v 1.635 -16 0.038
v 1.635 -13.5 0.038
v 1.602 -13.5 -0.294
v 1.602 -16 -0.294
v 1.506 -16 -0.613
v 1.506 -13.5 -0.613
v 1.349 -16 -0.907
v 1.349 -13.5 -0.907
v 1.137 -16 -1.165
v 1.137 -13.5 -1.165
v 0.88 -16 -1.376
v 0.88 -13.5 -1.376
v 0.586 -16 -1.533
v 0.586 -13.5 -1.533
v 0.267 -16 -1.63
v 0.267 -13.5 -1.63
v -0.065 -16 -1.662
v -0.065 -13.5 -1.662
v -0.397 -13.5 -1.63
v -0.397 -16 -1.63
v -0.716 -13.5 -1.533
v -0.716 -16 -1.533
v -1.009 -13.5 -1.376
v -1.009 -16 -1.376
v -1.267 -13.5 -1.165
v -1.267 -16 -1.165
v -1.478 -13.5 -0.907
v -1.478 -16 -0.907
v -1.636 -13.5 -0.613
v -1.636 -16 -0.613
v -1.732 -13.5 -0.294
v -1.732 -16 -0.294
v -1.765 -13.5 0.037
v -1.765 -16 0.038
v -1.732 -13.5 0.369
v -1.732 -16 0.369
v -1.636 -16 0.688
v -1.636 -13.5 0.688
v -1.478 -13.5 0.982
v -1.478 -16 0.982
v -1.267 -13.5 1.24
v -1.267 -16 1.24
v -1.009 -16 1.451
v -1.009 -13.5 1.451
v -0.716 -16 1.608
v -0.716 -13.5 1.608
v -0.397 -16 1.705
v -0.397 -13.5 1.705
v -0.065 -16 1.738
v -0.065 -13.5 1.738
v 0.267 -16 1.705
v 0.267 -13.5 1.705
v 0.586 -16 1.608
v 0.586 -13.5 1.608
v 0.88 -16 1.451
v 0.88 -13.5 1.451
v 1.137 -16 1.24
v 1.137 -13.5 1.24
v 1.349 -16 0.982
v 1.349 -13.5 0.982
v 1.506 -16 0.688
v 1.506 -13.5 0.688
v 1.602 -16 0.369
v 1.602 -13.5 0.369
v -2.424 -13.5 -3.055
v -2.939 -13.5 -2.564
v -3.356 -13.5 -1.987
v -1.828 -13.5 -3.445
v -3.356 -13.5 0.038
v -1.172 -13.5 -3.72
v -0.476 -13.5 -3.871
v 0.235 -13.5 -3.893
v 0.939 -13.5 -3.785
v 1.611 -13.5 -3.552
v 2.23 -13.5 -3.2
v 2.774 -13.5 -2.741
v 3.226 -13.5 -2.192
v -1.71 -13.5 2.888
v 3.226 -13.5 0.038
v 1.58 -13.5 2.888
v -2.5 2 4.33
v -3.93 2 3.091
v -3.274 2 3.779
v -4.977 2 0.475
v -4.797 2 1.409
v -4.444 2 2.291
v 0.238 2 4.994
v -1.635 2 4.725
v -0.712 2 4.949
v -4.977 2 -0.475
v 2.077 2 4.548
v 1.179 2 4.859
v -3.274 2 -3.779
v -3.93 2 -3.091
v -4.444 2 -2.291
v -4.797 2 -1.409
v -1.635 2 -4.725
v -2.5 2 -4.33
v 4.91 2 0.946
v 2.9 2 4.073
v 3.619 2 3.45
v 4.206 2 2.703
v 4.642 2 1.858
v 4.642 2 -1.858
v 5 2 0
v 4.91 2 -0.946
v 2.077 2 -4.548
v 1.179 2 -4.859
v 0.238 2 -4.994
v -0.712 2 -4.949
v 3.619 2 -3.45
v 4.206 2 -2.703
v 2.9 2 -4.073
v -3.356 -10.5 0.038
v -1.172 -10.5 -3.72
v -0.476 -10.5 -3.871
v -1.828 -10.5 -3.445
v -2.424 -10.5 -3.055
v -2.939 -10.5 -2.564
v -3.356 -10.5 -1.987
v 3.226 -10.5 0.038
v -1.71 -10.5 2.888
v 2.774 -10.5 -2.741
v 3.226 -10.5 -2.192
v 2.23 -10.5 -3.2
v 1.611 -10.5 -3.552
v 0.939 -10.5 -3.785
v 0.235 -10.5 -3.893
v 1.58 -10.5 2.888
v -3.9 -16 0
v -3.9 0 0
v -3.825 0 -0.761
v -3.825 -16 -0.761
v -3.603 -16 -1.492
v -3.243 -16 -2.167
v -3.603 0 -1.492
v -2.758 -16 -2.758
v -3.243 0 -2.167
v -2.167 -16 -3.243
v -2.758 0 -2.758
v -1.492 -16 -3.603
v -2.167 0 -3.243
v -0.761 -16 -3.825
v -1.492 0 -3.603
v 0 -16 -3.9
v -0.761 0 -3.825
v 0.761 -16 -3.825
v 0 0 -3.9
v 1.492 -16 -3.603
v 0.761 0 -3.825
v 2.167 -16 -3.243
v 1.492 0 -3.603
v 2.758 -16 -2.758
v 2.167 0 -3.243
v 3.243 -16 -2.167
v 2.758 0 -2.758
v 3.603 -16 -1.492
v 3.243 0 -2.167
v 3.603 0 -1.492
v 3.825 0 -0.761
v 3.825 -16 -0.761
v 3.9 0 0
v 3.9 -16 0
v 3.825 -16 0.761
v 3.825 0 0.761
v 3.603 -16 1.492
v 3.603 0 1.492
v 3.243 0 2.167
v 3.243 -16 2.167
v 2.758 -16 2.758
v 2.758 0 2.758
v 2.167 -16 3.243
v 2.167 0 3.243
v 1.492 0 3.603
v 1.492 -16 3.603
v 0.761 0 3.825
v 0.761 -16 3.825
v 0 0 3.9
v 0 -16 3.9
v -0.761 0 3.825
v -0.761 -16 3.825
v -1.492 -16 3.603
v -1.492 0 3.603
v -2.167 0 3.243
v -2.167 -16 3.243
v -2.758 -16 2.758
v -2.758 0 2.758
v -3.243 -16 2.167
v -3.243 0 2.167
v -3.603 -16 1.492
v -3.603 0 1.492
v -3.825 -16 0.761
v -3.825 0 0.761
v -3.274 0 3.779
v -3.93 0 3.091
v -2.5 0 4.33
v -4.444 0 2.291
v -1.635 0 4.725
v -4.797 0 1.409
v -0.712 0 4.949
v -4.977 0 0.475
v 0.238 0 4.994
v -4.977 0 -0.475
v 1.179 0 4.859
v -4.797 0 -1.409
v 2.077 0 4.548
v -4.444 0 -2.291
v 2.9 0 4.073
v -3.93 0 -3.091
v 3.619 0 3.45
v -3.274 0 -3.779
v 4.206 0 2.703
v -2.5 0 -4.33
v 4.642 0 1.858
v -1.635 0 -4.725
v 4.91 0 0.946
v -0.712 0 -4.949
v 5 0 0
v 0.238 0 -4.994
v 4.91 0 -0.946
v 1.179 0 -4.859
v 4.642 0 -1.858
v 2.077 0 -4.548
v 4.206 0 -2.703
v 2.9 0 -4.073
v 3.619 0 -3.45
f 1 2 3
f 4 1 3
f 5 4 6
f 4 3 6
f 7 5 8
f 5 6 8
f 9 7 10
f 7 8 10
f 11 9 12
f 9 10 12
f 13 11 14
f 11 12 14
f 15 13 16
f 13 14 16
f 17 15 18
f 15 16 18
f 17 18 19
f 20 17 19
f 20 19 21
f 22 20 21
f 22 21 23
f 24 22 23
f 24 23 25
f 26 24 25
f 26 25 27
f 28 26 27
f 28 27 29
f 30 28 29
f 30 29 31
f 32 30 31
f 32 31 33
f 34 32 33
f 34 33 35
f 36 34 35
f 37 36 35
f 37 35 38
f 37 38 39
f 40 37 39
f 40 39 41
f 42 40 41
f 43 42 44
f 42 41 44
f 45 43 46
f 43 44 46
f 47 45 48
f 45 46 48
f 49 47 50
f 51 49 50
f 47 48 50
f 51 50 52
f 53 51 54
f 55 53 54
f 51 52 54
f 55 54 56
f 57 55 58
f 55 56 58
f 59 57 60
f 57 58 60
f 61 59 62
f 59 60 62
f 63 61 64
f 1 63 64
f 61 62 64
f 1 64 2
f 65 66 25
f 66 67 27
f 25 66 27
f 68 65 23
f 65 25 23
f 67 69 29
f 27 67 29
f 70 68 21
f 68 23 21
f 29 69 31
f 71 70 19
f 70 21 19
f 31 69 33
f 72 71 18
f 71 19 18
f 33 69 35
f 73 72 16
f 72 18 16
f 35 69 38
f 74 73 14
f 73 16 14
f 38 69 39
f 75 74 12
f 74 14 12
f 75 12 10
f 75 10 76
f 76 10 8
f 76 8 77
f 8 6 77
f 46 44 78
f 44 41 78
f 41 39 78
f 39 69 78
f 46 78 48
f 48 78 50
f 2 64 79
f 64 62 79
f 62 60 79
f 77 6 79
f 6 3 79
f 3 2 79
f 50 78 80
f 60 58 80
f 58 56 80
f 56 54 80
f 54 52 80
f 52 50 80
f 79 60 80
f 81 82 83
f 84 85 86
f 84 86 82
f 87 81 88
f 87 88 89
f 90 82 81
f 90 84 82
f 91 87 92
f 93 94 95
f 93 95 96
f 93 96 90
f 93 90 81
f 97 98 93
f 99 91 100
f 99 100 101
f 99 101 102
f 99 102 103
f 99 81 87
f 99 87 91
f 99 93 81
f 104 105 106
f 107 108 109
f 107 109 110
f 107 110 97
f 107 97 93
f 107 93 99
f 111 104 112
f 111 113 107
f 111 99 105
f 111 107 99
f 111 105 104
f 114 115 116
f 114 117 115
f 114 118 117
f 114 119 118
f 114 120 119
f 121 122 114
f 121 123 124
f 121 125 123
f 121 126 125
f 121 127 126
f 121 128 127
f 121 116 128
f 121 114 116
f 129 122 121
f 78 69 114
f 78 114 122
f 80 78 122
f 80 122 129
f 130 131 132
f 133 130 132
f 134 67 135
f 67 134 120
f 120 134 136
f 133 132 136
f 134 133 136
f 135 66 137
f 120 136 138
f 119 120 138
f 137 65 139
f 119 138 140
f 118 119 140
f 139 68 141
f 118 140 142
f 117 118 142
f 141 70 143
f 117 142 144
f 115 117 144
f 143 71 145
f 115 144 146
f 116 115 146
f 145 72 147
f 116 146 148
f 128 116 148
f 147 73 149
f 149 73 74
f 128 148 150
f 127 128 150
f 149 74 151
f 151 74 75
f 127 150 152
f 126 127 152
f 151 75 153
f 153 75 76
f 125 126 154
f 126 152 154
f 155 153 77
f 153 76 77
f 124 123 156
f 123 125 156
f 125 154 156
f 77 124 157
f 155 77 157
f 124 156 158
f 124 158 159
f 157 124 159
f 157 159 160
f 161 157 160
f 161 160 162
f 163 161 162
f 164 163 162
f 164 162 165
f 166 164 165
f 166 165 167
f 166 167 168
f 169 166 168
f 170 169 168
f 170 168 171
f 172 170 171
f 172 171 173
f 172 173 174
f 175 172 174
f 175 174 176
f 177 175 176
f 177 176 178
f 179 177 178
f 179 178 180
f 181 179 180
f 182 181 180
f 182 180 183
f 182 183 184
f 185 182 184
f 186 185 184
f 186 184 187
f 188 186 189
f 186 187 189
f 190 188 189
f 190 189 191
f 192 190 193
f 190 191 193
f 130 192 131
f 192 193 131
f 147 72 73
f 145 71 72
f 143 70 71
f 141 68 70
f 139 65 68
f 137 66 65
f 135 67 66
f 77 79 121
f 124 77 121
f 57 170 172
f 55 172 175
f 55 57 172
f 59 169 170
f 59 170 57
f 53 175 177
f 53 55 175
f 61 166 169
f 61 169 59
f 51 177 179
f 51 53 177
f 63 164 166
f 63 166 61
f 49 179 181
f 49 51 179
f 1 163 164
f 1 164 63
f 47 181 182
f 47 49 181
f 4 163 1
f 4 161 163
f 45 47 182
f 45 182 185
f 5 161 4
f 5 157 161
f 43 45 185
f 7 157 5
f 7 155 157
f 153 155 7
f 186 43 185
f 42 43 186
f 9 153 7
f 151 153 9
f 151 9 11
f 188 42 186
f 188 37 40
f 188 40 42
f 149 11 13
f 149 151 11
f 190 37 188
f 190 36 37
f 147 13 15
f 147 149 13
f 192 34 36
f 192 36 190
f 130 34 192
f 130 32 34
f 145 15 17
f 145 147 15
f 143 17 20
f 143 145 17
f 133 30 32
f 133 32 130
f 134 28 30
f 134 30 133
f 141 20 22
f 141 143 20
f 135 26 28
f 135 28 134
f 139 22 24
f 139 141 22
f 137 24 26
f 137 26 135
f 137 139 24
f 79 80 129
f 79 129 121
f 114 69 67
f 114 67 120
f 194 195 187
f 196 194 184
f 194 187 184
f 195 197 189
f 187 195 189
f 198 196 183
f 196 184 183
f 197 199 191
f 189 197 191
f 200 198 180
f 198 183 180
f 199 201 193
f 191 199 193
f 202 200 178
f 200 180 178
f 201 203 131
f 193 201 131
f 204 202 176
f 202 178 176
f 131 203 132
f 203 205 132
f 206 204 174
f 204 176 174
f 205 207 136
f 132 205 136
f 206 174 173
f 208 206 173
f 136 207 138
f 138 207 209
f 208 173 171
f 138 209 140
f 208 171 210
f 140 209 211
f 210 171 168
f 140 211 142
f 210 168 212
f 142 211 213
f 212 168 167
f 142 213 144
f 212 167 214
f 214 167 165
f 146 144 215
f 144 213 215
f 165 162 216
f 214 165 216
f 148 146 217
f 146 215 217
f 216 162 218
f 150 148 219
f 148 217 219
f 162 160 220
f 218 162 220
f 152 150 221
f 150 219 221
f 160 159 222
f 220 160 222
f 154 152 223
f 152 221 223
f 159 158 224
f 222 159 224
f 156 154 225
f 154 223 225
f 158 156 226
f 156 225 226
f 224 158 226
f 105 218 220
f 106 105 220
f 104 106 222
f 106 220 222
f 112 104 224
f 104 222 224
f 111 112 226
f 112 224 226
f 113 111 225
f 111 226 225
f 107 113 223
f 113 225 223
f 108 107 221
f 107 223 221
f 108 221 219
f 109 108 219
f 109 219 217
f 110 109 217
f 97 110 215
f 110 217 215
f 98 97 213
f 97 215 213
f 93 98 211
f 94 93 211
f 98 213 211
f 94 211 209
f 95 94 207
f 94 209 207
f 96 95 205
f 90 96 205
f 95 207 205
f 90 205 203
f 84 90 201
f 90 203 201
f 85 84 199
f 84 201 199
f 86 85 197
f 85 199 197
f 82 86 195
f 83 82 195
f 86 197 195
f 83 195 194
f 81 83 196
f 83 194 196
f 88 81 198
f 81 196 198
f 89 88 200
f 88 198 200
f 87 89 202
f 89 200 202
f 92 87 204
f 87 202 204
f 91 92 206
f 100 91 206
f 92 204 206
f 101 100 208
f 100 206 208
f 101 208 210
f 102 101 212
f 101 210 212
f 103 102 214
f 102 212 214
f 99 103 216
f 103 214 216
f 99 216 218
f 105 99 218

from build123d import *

# Parameters (mm, degrees)
SKETCH1_R               = 5
BOSS_EXTRUDE1_DEPTH     = 2
SKETCH4_R               = 3.9
BOSS_EXTRUDE2_DEPTH     = 16
CUT_EXTRUDE4_DEPTH      = 3
SKETCH3_5_R             = 1.7
CUT_EXTRUDE5_DEPTH      = 3
CUT_EXTRUDE5_DEPTH_BACK = 3.5
SKETCH5_W               = 6.581793069
SKETCH5_H               = 3
CUT_EXTRUDE6_DEPTH      = 6.0375


with BuildPart() as part:
    # Sketch1 → Boss-Extrude1 (new body)
    with BuildSketch(Plane(origin=(0, 0, 0), x_dir=(1, 0, 0), z_dir=(0, 1, 0))):
        Circle(SKETCH1_R)
    extrude(amount=BOSS_EXTRUDE1_DEPTH)

    # Sketch4 → Boss-Extrude2 (add)
    with BuildSketch(Plane(origin=(0, 0, 0), x_dir=(-1, 0, 0), z_dir=(0, -1, 0))):
        Circle(SKETCH4_R)
    extrude(amount=BOSS_EXTRUDE2_DEPTH)

    # Sketch3 → Cut-Extrude4 (cut)
    with BuildSketch(Plane(origin=(0, -13.5, 0), x_dir=(1, 0, 0), z_dir=(0, 1, 0))):
        Polygon((3.225944629, -0.0375), (1.580496362, 2.8125), (-1.710400172, 2.8125), (-3.35584844, -0.0375), (-1.710400172, -2.8875), (1.580496362, -2.8875), align=None)
    extrude(amount=CUT_EXTRUDE4_DEPTH, mode=Mode.SUBTRACT)

    # Sketch3<5> → Cut-Extrude5 (cut, two sides)
    with BuildSketch(Plane(origin=(0, -13.5, 0), x_dir=(1, 0, 0), z_dir=(0, 1, 0))) as cut_extrude5_sk:
        with Locations((-0.064951905, -0.0375)):
            Circle(SKETCH3_5_R)
    extrude(amount=CUT_EXTRUDE5_DEPTH, mode=Mode.SUBTRACT)
    extrude(cut_extrude5_sk.sketch, amount=-CUT_EXTRUDE5_DEPTH_BACK, mode=Mode.SUBTRACT)

    # Sketch5 → Cut-Extrude6 (cut, through all)
    with BuildSketch(Plane.XY.offset(0.0375)):
        with Locations((-0.064951906, -12)):
            Rectangle(SKETCH5_W, SKETCH5_H)
    extrude(amount=-CUT_EXTRUDE6_DEPTH, mode=Mode.SUBTRACT)


solid = part.part
